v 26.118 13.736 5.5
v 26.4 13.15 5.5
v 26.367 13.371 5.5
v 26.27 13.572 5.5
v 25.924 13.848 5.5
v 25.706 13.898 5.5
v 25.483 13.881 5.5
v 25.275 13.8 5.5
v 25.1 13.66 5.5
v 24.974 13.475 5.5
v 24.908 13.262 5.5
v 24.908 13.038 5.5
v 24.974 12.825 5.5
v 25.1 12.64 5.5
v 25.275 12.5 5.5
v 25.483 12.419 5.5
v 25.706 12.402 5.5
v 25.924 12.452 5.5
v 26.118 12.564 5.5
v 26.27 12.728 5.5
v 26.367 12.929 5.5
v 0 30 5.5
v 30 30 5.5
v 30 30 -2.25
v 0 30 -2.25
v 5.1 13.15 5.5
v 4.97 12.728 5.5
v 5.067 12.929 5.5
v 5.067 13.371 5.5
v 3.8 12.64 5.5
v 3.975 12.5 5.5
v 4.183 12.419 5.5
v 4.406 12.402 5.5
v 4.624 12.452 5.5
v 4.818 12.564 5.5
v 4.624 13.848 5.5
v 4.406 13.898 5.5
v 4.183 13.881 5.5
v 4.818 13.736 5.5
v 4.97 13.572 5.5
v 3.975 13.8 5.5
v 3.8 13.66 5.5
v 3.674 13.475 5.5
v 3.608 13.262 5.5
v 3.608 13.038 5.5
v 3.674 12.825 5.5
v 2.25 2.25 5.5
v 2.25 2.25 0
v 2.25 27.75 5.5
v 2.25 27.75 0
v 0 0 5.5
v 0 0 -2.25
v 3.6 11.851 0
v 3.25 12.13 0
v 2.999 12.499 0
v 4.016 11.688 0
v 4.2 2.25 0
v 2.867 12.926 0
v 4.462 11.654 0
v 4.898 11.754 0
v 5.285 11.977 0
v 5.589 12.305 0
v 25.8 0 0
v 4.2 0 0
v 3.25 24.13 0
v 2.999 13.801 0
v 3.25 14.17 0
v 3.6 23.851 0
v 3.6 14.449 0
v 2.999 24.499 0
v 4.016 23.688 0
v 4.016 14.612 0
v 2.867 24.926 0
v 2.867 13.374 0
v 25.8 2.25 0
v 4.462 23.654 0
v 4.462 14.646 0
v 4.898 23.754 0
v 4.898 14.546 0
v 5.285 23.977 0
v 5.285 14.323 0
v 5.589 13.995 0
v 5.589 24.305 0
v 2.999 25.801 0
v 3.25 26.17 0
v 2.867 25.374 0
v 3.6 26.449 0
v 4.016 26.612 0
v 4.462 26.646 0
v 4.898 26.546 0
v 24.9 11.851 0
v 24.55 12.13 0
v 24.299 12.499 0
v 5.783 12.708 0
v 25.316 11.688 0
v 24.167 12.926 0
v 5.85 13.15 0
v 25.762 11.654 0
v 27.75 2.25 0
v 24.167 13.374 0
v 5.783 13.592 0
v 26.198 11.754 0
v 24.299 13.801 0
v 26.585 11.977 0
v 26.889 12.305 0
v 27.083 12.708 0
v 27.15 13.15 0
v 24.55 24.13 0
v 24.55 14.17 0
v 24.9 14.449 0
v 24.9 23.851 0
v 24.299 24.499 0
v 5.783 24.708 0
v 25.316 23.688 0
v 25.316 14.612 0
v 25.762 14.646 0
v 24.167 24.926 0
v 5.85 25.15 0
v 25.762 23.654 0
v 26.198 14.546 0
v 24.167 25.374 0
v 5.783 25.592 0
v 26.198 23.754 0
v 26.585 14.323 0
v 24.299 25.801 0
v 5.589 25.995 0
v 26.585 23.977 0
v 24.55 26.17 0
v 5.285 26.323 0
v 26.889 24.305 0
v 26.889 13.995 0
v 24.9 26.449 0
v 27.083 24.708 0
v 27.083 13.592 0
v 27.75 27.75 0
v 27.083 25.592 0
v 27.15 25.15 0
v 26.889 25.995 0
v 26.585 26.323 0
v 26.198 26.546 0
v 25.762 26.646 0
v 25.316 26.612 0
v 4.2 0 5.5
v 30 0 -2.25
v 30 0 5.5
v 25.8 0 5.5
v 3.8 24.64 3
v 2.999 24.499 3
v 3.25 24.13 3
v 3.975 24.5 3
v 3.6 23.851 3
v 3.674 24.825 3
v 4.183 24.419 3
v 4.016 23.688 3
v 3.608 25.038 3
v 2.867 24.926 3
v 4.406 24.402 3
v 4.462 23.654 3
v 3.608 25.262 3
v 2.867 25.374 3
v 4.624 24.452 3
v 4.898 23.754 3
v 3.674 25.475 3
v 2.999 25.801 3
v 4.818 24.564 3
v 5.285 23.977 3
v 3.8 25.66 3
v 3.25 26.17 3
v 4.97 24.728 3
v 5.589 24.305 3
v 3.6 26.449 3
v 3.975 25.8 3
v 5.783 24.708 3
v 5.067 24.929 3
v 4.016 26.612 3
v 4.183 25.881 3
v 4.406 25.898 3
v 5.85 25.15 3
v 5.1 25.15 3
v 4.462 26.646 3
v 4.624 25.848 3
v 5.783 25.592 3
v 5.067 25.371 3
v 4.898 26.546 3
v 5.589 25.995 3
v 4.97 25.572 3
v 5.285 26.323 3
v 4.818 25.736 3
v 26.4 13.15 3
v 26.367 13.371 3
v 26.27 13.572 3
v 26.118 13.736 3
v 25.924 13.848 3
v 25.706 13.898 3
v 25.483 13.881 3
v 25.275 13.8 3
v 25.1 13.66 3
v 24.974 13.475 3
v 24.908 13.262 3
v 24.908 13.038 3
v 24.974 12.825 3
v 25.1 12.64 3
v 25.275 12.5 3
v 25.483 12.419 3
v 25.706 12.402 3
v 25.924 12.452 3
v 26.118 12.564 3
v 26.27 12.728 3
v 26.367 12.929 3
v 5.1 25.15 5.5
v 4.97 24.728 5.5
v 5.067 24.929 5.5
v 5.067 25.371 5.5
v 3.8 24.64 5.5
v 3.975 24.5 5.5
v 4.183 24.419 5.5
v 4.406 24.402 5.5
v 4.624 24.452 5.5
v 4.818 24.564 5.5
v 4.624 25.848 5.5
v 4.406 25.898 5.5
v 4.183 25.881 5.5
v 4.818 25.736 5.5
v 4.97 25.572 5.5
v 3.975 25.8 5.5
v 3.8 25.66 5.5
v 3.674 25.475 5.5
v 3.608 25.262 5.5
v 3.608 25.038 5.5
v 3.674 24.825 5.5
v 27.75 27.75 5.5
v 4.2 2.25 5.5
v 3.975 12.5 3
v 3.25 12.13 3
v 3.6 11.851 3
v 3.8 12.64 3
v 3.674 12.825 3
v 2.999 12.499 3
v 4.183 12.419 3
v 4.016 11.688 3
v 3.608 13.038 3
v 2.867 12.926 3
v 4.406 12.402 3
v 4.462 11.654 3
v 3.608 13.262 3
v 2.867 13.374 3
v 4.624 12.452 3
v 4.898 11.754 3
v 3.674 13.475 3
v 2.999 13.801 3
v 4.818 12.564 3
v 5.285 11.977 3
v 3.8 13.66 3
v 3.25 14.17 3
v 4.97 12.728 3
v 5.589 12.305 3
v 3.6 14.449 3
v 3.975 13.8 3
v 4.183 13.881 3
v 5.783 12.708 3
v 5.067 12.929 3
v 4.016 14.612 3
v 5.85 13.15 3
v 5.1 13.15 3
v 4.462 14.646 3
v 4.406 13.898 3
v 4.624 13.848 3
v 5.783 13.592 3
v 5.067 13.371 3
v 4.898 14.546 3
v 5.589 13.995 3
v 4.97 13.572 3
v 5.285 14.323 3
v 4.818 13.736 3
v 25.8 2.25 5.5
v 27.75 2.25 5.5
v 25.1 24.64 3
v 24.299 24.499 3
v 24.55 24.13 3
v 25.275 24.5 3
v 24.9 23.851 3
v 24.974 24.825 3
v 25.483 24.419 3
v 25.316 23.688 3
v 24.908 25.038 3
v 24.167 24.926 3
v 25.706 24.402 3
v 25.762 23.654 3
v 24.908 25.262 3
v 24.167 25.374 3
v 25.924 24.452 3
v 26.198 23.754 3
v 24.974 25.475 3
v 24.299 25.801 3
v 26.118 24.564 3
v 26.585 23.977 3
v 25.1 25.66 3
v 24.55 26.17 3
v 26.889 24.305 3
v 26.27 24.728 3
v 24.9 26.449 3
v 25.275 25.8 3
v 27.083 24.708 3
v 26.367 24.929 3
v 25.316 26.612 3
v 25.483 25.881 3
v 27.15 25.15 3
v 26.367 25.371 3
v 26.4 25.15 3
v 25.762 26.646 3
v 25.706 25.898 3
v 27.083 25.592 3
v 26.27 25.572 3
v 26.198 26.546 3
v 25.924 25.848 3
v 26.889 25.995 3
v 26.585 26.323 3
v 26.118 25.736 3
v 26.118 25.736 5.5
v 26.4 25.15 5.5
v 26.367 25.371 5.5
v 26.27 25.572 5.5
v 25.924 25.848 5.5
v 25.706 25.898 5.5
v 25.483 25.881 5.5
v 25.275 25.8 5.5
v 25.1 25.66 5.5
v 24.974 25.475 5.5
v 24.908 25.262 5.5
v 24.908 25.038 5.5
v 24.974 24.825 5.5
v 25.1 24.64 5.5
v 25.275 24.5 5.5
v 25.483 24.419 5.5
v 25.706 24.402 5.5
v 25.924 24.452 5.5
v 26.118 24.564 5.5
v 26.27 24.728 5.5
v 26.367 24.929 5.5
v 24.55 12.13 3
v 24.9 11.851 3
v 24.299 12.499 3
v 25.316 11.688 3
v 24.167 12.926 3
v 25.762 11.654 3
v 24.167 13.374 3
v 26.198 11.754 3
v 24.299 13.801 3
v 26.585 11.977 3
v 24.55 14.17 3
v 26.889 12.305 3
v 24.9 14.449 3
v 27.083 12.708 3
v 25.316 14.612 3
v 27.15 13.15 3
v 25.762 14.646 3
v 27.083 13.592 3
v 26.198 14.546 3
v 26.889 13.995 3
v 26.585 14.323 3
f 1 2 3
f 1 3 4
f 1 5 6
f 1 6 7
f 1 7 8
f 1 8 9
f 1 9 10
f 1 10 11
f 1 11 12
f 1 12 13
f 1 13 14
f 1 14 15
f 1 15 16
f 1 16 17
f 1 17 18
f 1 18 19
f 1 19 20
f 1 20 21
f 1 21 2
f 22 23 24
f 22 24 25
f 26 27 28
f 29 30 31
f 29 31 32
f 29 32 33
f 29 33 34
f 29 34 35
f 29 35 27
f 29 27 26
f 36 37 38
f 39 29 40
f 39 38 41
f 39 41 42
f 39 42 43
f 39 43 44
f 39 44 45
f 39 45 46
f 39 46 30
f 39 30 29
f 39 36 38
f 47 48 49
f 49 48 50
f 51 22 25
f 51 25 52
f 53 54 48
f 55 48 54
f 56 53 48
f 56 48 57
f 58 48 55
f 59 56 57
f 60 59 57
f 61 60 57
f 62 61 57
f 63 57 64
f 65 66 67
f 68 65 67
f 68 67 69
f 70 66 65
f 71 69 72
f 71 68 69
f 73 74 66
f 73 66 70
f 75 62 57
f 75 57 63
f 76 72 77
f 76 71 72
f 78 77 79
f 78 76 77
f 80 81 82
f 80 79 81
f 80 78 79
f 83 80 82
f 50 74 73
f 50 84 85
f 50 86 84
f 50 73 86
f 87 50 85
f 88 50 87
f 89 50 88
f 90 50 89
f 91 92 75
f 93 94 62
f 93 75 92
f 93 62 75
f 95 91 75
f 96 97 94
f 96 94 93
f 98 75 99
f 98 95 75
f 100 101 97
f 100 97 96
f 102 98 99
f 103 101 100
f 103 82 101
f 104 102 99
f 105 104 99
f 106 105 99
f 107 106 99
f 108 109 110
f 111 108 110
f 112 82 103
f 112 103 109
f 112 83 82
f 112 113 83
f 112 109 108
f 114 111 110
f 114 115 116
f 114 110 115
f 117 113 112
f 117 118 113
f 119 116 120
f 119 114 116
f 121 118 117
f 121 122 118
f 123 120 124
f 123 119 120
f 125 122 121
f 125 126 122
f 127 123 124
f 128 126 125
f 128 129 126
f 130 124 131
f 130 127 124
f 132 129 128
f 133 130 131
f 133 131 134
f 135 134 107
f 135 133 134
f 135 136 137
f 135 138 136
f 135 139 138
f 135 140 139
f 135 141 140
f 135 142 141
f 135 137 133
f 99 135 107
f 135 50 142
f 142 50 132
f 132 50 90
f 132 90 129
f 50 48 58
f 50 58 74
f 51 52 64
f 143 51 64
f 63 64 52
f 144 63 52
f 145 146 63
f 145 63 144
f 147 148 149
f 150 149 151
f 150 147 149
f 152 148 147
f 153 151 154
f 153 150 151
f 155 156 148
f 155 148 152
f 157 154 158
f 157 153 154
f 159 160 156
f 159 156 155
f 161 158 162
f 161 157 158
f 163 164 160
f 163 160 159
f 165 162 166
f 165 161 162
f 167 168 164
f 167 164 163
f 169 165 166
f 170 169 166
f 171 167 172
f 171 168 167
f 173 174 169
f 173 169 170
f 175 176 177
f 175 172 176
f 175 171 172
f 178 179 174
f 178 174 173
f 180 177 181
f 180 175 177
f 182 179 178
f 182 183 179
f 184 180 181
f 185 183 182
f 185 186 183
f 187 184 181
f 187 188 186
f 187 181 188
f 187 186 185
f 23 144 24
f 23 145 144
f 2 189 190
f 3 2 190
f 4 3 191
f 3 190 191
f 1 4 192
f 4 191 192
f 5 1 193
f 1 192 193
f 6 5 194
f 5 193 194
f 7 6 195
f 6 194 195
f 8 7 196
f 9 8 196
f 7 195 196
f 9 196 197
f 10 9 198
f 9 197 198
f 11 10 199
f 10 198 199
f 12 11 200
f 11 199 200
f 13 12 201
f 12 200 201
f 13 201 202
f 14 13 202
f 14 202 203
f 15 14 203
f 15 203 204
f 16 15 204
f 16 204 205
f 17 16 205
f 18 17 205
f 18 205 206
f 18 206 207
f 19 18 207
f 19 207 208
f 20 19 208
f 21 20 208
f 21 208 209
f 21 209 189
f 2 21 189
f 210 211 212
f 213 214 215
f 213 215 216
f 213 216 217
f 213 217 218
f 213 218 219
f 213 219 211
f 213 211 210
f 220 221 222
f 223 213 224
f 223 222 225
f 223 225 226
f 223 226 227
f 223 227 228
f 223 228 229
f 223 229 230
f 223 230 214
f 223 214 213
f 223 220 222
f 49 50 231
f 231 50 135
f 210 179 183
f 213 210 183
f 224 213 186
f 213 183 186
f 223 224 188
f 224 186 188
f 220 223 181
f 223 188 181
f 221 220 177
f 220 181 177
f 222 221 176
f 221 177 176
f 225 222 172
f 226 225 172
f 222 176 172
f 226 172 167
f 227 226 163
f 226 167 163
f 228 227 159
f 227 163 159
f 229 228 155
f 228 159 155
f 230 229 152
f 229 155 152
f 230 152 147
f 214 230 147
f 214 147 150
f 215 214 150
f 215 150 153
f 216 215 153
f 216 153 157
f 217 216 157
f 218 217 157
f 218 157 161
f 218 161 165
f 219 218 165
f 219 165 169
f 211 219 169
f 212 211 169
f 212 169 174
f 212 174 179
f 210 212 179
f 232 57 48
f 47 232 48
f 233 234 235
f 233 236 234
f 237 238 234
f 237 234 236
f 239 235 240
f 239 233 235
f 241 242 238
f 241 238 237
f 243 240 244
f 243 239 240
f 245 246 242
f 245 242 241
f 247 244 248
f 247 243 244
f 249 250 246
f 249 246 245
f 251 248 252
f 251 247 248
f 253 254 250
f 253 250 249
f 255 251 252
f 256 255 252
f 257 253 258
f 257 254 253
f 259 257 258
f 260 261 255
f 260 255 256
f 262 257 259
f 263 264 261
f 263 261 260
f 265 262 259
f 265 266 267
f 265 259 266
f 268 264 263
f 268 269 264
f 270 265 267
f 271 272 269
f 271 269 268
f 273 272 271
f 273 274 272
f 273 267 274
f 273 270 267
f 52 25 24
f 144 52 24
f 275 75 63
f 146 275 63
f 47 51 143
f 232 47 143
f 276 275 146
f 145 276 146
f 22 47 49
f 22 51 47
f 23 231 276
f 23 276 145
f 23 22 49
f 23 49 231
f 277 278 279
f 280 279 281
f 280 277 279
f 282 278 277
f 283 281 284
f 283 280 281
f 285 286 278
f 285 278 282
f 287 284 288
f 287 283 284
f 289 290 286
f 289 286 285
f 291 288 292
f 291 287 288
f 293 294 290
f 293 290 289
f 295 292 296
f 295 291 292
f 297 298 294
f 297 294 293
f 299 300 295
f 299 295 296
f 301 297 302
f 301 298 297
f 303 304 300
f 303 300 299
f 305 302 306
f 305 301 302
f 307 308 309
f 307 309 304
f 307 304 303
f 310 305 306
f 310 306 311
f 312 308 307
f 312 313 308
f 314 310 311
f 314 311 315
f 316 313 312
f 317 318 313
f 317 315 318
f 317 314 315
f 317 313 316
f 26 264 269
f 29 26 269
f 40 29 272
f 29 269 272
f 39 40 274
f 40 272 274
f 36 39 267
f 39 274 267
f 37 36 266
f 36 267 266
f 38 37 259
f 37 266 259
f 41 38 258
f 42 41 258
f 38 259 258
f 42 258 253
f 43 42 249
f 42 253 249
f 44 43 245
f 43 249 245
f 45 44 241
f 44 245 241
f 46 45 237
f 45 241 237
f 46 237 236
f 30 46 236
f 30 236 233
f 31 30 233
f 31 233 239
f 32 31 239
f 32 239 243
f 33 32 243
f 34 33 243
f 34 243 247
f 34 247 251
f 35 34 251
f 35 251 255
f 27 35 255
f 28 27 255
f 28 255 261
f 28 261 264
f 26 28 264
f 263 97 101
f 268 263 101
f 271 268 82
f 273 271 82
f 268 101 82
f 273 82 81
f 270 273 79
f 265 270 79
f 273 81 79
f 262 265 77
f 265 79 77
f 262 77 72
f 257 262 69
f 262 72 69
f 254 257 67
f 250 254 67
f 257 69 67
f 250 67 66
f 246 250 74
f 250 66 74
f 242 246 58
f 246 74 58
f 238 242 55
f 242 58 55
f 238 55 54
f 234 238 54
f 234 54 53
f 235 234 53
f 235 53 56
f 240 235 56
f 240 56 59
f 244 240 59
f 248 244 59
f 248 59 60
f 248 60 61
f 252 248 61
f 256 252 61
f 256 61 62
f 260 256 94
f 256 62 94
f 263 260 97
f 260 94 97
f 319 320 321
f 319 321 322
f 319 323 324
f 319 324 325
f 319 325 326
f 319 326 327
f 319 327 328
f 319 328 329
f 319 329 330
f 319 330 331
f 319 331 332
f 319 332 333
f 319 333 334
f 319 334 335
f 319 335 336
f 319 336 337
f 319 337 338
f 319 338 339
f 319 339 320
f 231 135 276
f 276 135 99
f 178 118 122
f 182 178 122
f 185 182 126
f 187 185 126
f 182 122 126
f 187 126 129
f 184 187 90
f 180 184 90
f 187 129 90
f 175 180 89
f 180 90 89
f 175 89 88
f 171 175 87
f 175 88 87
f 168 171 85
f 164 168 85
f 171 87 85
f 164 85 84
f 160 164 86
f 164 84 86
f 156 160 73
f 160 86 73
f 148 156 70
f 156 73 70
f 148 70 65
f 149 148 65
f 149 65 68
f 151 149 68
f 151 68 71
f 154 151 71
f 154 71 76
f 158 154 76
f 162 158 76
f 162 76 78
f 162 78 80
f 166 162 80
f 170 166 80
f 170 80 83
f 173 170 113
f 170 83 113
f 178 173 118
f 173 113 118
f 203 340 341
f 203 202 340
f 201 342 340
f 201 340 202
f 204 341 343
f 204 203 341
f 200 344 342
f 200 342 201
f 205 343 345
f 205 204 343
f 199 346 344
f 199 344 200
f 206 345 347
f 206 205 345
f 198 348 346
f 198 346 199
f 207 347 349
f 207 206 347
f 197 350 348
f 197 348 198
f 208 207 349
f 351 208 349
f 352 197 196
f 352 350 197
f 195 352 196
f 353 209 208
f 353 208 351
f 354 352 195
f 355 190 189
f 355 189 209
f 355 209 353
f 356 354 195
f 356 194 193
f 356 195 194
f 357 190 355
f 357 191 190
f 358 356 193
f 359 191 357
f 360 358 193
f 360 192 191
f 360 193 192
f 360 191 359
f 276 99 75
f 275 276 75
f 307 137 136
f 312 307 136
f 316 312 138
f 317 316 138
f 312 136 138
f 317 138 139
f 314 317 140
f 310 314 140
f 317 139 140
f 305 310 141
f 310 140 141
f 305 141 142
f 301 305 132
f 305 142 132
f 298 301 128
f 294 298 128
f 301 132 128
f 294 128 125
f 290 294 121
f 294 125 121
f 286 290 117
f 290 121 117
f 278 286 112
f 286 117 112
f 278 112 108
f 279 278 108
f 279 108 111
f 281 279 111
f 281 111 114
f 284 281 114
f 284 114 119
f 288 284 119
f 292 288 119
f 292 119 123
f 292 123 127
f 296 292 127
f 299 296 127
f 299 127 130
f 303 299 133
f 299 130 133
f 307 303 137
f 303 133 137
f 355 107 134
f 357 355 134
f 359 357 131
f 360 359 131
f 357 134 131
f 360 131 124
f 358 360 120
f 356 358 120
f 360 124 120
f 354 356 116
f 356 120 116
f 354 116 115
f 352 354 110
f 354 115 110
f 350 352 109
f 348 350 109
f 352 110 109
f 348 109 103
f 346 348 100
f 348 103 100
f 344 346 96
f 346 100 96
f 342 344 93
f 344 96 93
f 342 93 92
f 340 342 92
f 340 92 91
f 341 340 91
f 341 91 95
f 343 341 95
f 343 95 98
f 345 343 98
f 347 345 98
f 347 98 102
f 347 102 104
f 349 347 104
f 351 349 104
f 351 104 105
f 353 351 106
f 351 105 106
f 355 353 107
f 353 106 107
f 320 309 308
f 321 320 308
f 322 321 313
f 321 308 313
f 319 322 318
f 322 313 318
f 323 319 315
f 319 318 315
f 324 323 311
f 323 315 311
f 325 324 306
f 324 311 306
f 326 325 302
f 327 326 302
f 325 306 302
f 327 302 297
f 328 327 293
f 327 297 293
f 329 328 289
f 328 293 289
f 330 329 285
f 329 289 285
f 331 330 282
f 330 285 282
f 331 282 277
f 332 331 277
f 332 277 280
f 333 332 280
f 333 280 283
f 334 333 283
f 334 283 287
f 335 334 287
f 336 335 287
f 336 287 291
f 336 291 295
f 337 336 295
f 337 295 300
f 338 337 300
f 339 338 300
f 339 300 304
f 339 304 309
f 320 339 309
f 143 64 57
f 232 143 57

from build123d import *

# Parameters (mm, degrees)
F1_DEPTH = 5.5
F0_W     = 21.6
F0_H     = 2.25
F2_DEPTH = 2.25
F3_R     = 1.5
F3_R_2   = 0.75
F4_DEPTH = 3
F5_DEPTH = 5.5


with BuildPart() as f1:
    # F0 (on Top) → F1 (new body)
    with BuildSketch(Plane.XY):
        Polygon((0, 30), (0, 0), (4.2, 0), (4.2, 2.25), (2.25, 2.25), (2.25, 27.75), (27.75, 27.75), (27.75, 2.25), (25.8, 2.25), (25.8, 0), (30, 0), (30, 30), align=None)
    extrude(amount=F1_DEPTH)

    # F0 (on Top) → F2 (join)
    with BuildSketch(Plane.XY):
        Polygon((2.25, 2.25), (4.2, 2.25), (25.8, 2.25), (27.75, 2.25), (27.75, 27.75), (2.25, 27.75), align=None)
        Polygon((0, 30), (0, 0), (4.2, 0), (4.2, 2.25), (2.25, 2.25), (2.25, 27.75), (27.75, 27.75), (27.75, 2.25), (25.8, 2.25), (25.8, 0), (30, 0), (30, 30), align=None)
        with Locations((15, 1.125)):
            Rectangle(F0_W, F0_H)
    extrude(amount=-F2_DEPTH)

    # F3 (on face) → F4 (join)
    with BuildSketch(Plane.XY):
        with Locations((25.65, 25.15)):
            Circle(F3_R)
        with Locations((25.65, 25.15)):
            Circle(F3_R_2, mode=Mode.SUBTRACT)
        with Locations((25.65, 13.15)):
            Circle(F3_R)
        with Locations((25.65, 13.15)):
            Circle(F3_R_2, mode=Mode.SUBTRACT)
        with Locations((4.35, 25.15)):
            Circle(F3_R)
        with Locations((4.35, 25.15)):
            Circle(F3_R_2, mode=Mode.SUBTRACT)
        with Locations((4.35, 13.15)):
            Circle(F3_R)
        with Locations((4.35, 13.15)):
            Circle(F3_R_2, mode=Mode.SUBTRACT)
    extrude(amount=F4_DEPTH)

    # F3 (on face) → F5 (join)
    with BuildSketch(Plane.XY):
        with Locations((4.35, 25.15)):
            Circle(F3_R_2)
        with Locations((25.65, 25.15)):
            Circle(F3_R_2)
        with Locations((25.65, 13.15)):
            Circle(F3_R_2)
        with Locations((4.35, 13.15)):
            Circle(F3_R_2)
    extrude(amount=F5_DEPTH)


solid = f1.part
